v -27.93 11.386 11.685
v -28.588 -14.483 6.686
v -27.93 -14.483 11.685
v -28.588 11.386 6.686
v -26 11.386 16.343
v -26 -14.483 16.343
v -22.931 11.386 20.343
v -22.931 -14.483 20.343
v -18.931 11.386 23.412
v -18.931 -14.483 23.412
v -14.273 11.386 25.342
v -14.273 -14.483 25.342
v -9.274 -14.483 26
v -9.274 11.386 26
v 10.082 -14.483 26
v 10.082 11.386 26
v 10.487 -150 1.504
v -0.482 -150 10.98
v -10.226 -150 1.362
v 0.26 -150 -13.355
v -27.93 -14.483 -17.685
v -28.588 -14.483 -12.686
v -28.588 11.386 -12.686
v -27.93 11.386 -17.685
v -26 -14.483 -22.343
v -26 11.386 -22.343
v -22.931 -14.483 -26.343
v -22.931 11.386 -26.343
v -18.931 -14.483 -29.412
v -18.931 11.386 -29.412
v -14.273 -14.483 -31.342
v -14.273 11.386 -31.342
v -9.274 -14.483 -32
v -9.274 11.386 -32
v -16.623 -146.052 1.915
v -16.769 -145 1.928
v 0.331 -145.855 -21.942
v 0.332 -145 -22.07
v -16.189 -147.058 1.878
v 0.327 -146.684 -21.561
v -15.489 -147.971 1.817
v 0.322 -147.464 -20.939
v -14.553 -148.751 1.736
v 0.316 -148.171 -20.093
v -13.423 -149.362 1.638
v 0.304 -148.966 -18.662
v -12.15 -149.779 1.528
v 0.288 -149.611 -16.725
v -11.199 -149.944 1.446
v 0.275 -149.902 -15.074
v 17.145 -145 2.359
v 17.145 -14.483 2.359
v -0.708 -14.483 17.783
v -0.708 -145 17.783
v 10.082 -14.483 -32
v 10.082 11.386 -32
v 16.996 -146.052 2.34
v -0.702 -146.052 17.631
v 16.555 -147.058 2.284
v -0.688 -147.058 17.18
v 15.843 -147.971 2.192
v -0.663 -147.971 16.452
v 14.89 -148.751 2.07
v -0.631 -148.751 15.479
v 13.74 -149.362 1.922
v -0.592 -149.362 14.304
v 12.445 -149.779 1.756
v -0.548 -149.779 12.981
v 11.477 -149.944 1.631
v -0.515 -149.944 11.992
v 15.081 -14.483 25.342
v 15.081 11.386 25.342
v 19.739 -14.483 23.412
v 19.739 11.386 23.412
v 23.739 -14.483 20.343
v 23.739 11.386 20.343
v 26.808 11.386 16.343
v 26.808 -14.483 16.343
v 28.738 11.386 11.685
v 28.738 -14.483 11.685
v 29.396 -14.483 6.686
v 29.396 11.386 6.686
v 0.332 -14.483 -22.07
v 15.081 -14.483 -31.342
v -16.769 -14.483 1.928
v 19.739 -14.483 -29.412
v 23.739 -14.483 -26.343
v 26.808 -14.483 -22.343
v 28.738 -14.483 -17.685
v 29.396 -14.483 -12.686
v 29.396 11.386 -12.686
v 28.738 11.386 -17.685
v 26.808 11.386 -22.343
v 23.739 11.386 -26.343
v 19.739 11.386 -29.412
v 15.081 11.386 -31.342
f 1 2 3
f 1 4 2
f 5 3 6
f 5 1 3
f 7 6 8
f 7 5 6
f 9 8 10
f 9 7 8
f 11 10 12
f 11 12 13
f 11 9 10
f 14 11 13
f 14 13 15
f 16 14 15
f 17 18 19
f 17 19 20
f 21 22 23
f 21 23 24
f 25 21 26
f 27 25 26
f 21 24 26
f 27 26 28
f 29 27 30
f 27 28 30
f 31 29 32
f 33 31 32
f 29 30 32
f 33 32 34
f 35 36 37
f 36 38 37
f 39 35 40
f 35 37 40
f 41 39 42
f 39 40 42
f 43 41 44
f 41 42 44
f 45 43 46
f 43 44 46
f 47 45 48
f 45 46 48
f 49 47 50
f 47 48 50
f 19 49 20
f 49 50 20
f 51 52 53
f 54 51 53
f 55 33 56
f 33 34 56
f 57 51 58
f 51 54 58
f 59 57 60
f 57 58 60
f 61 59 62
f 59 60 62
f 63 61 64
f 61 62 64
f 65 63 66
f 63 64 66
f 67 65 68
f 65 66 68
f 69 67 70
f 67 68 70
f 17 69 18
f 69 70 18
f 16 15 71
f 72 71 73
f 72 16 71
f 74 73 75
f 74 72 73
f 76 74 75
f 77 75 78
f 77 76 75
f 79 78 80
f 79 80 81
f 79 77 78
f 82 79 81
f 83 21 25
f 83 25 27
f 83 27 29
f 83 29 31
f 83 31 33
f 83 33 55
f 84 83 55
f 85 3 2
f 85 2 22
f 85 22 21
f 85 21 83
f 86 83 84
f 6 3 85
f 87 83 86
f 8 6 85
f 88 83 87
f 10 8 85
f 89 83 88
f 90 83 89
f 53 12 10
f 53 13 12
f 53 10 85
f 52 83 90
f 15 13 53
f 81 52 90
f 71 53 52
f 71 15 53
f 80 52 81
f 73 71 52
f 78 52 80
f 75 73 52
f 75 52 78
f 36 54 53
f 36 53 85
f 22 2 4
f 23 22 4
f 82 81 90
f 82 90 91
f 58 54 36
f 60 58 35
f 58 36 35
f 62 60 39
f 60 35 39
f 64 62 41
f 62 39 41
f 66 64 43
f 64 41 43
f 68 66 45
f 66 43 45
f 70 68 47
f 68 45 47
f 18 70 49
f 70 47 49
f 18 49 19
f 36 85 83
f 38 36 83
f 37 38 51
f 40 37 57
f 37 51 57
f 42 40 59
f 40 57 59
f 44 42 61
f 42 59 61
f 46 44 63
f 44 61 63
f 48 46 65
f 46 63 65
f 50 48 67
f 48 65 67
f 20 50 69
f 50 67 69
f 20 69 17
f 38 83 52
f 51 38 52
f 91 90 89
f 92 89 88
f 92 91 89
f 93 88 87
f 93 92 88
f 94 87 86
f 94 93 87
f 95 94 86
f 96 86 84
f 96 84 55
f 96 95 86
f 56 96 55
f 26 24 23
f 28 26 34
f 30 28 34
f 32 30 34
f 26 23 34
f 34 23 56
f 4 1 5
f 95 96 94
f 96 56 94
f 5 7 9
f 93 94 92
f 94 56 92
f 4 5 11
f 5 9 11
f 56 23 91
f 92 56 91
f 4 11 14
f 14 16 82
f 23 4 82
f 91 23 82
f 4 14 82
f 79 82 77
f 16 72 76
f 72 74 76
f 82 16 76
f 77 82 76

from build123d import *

# Parameters (mm, degrees)
F1_DEPTH      = 150
F2_W          = 57.983538
F2_H          = 25.869577
F3_DEPTH      = 26
F3_DEPTH_BACK = 32
F4_R          = 19.313708
F5_R          = 5


with BuildPart() as f1:
    # F0 (on Front) → F1 (new body)
    with BuildSketch(Plane.XZ):
        Polygon((-16.769175, 1.928175), (0.331647, -22.070456), (17.145061, 2.359288), (-0.707533, 17.782993), align=None)
    extrude(amount=F1_DEPTH)

    # F2 (on Top) → F3 (join, two sides)
    with BuildSketch(Plane.XY) as f3_sk:
        with Locations((0.403912, -1.548561)):
            Rectangle(F2_W, F2_H)
    extrude(amount=F3_DEPTH)
    extrude(f3_sk.sketch, amount=-F3_DEPTH_BACK)

    # F4
    f4_edges = [f1.edges().sort_by_distance(p)[0] for p in [
        (-28.587857, -1.548562, -32),
        (29.395681, -1.548562, -32),
        (29.395681, -1.548562, 26),
        (-28.587857, -1.548562, 26),
    ]]
    fillet(f4_edges, radius=F4_R)

    # F5
    f5_edges = [f1.edges().sort_by_distance(p)[0] for p in [
        (8.218764, -150, 10.071141),
        (8.738354, -150, -9.855584),
        (-8.738354, -150, 9.855584),
        (-8.218764, -150, -10.071141),
    ]]
    fillet(f5_edges, radius=F5_R)


solid = f1.part
